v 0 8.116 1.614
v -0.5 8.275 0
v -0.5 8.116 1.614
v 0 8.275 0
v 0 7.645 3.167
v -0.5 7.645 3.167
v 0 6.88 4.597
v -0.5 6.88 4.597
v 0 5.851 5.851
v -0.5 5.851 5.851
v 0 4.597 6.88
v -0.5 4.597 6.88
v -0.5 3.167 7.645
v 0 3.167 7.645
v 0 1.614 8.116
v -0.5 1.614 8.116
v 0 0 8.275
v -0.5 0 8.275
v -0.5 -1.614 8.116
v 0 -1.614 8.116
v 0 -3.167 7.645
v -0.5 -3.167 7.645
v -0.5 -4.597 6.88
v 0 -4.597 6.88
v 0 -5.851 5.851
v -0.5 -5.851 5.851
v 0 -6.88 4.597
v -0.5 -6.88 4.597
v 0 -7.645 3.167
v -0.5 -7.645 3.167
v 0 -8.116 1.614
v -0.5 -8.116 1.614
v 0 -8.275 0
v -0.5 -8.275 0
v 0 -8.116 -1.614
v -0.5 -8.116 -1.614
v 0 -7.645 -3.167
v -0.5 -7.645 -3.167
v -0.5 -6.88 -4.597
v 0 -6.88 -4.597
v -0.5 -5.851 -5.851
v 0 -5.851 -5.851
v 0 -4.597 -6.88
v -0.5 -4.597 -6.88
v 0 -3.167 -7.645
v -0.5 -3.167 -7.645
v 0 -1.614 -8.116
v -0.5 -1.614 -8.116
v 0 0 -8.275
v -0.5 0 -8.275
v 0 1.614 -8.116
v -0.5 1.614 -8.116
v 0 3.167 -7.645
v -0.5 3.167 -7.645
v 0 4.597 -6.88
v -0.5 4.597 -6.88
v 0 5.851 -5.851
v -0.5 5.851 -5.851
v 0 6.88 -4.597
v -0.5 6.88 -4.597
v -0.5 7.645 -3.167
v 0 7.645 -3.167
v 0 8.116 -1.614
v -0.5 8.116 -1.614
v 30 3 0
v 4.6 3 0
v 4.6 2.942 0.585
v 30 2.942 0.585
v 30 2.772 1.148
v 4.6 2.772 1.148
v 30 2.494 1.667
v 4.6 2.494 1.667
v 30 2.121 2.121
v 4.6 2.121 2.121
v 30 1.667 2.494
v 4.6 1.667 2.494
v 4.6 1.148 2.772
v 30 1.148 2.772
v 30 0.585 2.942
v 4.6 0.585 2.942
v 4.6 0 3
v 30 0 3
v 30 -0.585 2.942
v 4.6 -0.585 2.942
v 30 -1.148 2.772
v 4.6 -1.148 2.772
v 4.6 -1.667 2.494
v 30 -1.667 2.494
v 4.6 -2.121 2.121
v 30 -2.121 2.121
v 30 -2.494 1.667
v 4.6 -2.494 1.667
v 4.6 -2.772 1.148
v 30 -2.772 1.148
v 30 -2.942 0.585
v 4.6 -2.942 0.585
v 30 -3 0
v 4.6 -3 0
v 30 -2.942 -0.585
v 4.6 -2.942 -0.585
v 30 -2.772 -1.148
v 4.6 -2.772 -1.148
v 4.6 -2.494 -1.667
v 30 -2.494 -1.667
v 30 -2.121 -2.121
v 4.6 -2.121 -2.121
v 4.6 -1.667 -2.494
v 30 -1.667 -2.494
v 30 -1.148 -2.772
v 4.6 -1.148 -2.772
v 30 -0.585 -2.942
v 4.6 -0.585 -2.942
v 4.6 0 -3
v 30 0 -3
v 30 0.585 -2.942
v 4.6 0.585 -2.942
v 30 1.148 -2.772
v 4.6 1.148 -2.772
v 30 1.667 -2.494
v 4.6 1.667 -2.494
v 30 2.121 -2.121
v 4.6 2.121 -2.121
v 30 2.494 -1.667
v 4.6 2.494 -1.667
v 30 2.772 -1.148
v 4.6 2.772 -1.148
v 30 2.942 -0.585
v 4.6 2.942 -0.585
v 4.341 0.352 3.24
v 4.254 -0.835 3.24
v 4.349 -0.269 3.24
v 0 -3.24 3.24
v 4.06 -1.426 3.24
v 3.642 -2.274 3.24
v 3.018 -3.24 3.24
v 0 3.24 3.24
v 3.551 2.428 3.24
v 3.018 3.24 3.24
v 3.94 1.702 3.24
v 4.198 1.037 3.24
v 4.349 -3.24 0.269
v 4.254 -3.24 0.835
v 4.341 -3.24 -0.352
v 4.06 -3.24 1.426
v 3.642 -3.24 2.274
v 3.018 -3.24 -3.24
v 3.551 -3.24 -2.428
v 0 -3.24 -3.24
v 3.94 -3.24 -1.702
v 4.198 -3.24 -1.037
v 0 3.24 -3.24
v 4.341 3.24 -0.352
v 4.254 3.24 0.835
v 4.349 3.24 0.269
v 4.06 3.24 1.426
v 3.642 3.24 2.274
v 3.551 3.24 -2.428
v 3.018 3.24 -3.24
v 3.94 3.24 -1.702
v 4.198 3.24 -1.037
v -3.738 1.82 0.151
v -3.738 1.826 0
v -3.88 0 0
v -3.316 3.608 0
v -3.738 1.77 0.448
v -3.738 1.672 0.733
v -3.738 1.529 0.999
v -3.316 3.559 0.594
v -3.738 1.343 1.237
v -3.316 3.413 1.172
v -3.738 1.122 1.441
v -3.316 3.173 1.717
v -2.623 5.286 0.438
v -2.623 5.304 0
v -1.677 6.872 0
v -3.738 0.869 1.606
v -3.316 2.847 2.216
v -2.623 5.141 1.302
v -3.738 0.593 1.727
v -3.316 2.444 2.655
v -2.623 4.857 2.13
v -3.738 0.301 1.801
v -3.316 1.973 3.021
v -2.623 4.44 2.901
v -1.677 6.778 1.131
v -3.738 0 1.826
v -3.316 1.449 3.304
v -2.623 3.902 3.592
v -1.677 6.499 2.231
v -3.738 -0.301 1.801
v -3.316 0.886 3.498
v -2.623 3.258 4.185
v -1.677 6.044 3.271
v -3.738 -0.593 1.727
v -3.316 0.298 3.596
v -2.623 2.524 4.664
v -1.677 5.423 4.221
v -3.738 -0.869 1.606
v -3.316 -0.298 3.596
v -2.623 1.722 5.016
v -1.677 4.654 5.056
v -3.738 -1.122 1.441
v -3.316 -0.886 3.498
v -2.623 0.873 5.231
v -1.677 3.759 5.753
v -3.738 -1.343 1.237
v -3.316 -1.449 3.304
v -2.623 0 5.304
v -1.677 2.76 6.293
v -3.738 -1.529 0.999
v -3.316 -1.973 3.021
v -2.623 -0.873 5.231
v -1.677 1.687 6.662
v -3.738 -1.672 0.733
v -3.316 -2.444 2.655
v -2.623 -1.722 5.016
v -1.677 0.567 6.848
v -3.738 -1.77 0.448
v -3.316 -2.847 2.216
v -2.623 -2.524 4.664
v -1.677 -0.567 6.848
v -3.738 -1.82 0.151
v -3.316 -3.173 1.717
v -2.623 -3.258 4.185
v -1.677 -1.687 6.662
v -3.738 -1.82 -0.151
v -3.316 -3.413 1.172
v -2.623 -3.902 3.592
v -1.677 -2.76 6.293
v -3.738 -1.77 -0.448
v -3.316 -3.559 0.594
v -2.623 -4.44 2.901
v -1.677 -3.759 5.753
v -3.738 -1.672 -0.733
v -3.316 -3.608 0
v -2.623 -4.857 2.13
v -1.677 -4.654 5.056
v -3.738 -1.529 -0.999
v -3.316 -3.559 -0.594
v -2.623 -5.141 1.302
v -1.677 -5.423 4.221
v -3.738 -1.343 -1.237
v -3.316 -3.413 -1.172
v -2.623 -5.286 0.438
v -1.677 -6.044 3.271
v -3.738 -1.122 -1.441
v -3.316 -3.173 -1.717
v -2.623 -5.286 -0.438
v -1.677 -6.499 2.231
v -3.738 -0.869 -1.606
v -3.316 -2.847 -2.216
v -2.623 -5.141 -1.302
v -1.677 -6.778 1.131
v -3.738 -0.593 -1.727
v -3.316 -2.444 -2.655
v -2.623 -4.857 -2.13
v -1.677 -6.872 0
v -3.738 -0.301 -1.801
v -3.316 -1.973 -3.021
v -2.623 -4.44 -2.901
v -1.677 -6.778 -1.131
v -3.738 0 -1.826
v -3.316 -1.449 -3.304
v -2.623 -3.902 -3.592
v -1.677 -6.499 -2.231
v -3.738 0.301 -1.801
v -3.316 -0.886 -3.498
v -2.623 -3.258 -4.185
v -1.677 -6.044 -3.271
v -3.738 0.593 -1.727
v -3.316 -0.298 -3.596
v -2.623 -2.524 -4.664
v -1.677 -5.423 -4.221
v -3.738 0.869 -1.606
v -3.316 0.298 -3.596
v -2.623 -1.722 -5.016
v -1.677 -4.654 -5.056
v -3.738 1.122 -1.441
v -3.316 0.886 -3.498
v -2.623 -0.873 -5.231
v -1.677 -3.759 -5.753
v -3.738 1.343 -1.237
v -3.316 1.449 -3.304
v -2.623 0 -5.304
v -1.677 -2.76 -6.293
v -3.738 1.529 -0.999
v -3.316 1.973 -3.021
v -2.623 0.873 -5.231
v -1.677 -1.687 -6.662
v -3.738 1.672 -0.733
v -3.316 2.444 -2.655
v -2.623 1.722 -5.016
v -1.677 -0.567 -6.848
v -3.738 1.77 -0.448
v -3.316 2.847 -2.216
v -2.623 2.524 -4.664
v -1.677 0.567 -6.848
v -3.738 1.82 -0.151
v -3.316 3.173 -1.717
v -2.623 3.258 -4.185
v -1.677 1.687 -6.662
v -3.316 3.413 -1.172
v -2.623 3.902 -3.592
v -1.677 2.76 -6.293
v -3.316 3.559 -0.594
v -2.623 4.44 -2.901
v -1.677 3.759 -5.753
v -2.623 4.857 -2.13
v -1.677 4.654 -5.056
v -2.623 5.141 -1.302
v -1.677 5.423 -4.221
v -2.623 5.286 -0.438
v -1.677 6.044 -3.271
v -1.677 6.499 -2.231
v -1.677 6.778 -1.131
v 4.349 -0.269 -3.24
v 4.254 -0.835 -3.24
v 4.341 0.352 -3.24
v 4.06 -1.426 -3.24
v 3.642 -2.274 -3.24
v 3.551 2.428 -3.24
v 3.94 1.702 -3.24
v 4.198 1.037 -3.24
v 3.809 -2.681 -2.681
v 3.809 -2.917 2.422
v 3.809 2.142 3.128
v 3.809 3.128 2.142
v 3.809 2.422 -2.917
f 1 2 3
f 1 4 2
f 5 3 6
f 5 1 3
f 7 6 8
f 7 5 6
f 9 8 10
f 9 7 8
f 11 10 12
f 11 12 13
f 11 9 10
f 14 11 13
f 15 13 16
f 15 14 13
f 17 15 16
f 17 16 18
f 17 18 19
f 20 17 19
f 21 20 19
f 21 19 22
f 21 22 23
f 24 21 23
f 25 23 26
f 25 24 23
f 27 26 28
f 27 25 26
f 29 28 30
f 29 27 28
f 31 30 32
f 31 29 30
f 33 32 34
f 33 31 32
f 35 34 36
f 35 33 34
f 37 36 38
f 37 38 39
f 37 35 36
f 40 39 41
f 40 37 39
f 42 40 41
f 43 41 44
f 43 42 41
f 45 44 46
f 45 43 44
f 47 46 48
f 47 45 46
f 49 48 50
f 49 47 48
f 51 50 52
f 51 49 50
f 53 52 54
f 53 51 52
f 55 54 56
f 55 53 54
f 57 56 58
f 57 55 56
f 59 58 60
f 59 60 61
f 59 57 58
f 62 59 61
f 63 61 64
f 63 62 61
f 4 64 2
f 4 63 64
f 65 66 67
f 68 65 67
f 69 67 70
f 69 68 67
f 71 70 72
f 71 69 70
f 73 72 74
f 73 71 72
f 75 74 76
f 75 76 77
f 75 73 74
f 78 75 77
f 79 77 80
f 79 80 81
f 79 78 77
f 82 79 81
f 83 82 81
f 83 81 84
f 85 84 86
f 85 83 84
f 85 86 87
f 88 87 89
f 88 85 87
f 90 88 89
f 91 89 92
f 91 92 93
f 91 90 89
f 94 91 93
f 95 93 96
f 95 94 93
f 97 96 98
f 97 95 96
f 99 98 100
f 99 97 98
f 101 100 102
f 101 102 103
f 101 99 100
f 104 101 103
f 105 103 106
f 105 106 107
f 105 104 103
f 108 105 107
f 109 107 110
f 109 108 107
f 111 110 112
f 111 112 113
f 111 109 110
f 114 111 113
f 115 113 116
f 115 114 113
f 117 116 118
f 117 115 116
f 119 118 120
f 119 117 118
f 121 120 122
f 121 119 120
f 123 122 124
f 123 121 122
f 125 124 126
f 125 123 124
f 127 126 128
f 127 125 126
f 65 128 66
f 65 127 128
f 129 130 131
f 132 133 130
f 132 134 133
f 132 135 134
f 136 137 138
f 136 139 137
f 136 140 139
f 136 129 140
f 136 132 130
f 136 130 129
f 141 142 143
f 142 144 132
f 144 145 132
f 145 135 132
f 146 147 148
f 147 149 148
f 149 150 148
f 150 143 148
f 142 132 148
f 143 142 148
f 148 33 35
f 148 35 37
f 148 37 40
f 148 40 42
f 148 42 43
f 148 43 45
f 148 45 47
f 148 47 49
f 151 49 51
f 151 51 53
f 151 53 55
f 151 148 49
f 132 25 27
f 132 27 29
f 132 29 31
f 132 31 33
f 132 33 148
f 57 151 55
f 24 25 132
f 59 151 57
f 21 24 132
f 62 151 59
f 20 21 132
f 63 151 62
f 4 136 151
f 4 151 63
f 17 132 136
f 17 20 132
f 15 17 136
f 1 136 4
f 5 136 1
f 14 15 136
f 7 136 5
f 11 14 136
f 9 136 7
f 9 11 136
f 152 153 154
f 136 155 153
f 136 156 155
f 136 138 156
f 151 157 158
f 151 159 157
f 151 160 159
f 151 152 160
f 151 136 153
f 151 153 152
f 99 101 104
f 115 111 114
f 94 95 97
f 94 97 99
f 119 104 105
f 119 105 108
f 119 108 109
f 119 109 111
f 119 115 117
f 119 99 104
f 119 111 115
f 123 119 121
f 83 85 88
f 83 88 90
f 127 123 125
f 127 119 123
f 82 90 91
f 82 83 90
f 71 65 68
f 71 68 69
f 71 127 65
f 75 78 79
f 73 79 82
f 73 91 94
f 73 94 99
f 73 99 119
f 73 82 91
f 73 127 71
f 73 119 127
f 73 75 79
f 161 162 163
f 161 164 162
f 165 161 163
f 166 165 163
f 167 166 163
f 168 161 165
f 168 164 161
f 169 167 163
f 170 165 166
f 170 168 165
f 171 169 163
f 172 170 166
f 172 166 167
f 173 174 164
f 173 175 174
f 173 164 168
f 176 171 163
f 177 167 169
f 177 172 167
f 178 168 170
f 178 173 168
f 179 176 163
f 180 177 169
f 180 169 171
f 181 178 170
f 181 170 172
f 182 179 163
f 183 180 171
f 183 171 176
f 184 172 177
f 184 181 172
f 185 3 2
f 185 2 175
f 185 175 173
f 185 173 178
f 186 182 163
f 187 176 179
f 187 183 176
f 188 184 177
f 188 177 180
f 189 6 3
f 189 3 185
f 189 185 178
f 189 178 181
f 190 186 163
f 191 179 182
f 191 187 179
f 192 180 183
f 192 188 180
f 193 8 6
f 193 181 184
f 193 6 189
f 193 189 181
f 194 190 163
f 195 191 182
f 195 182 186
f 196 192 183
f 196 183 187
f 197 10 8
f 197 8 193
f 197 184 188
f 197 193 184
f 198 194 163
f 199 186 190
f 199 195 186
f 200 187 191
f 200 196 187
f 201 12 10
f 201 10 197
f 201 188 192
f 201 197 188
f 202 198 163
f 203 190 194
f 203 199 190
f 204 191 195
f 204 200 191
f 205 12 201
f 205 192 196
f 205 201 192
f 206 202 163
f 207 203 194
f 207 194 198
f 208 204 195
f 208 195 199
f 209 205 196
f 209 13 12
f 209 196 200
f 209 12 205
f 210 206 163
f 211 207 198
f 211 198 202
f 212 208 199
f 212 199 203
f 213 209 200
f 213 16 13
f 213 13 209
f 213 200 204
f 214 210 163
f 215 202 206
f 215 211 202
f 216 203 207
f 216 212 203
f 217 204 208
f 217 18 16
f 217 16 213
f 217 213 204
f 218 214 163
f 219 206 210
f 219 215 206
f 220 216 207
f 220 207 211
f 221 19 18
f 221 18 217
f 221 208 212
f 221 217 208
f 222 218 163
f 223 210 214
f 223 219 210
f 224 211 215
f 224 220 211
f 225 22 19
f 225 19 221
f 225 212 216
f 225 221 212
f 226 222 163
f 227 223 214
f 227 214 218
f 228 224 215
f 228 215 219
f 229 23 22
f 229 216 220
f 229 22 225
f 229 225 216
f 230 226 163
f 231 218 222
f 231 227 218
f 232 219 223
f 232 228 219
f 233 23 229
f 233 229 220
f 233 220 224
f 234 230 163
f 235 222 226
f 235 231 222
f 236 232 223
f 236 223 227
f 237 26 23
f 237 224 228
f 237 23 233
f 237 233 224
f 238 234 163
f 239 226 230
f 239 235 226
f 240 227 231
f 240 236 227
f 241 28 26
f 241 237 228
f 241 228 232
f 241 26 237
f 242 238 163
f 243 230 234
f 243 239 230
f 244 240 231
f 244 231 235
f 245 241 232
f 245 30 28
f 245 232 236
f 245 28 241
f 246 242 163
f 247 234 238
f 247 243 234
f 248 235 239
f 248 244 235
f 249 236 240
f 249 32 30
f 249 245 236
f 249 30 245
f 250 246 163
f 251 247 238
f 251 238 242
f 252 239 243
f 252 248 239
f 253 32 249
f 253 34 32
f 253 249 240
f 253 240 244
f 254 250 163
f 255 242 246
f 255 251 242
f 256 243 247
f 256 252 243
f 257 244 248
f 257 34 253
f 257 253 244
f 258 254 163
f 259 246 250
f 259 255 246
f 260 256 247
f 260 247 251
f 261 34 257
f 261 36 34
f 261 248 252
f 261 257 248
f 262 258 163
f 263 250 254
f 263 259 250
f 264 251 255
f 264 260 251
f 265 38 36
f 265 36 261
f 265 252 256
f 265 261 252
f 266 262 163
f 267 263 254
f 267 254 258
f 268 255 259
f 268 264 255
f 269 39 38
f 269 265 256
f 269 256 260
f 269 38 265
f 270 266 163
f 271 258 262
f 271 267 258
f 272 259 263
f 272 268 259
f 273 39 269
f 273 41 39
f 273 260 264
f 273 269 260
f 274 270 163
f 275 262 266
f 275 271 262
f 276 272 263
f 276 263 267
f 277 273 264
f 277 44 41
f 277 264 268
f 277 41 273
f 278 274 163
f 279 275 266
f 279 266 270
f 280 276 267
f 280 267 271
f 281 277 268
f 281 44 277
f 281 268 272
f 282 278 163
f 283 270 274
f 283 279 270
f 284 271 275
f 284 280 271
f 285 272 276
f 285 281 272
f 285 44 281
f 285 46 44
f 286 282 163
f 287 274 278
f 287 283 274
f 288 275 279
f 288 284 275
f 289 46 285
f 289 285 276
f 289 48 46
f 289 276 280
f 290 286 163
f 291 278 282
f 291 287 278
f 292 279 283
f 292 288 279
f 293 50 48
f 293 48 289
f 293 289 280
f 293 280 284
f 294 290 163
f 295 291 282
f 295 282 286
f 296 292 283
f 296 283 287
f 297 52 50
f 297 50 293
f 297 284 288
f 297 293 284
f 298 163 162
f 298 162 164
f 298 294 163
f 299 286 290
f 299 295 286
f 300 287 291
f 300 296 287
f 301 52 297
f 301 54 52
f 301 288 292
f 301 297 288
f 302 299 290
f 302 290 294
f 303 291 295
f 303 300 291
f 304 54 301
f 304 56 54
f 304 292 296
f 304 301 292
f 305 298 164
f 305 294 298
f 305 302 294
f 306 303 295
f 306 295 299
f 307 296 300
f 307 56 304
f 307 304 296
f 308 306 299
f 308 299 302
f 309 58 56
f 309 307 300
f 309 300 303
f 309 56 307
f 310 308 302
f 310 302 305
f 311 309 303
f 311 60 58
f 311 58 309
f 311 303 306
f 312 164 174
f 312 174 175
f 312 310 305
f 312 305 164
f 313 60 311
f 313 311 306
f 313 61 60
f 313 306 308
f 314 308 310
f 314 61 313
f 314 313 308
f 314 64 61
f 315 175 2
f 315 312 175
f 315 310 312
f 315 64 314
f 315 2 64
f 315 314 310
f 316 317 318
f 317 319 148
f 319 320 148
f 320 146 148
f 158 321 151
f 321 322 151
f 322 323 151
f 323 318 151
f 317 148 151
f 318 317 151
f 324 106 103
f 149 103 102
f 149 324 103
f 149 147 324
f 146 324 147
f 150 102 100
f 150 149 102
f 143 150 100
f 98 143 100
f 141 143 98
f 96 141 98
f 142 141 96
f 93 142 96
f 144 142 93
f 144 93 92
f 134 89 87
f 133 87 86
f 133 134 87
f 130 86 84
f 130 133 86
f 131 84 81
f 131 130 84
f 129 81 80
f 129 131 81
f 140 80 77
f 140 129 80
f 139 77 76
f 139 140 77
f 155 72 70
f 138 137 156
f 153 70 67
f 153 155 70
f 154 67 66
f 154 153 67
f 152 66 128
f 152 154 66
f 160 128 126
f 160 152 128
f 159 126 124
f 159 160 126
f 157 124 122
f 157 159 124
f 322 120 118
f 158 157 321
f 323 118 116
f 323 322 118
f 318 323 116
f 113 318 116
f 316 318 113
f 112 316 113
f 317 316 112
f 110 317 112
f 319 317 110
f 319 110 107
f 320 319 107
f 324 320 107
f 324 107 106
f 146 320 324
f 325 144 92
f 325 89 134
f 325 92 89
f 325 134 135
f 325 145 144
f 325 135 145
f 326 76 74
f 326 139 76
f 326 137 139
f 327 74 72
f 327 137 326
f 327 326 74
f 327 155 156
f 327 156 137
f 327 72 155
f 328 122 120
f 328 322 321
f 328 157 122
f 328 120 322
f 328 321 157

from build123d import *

# Parameters (mm, degrees)
SKETCH_2_W      = 6.48
SKETCH_2_H      = 6.48
EXTRUDE_1_DEPTH = 4.6


with BuildPart() as part:
    # Эскиз1 → Повернуть1 (revolve)
    with BuildSketch(Plane.XY):
        with BuildLine():
            Line((30, 0), (-3.88, 0))
            ThreePointArc((-3.88, 0), (-3.002420637, 4.469340695), (-0.5, 8.275))
            Line((-0.5, 8.275), (0, 8.275))
            Line((0, 8.275), (0, 3))
            Line((0, 3), (30, 3))
            Line((30, 3), (30, 0))
        make_face()
    revolve(axis=Axis((-946.390579576, 0, 0), (1, 0, 0)))

    # Эскиз2 → Бобышка-Вытянуть1 (add)
    with BuildSketch(Plane(origin=(0, 0, 0), x_dir=(0, 0, -1), z_dir=(1, 0, 0))):
        Rectangle(SKETCH_2_W, SKETCH_2_H)
    extrude(amount=EXTRUDE_1_DEPTH)


with BuildPart() as body_2:
    # Эскиз3 → Повернуть2 (revolve)
    with BuildSketch(Plane(origin=(0, 0, 0), x_dir=(-1, 0, 0), z_dir=(0, -0.707106781, 0.707106781))):
        Polygon((-4.6, 3), (-2.017948058, 5.582051942), (-7.182051942, 5.582051942), align=None)
    revolve(axis=Axis((1000, 0, 0), (-1, 0, 0)))


with BuildPart() as part_1:
    add(part.part)

    # Combine 1: cut body 2
    add(body_2.part, mode=Mode.SUBTRACT)


solid = part_1.part
